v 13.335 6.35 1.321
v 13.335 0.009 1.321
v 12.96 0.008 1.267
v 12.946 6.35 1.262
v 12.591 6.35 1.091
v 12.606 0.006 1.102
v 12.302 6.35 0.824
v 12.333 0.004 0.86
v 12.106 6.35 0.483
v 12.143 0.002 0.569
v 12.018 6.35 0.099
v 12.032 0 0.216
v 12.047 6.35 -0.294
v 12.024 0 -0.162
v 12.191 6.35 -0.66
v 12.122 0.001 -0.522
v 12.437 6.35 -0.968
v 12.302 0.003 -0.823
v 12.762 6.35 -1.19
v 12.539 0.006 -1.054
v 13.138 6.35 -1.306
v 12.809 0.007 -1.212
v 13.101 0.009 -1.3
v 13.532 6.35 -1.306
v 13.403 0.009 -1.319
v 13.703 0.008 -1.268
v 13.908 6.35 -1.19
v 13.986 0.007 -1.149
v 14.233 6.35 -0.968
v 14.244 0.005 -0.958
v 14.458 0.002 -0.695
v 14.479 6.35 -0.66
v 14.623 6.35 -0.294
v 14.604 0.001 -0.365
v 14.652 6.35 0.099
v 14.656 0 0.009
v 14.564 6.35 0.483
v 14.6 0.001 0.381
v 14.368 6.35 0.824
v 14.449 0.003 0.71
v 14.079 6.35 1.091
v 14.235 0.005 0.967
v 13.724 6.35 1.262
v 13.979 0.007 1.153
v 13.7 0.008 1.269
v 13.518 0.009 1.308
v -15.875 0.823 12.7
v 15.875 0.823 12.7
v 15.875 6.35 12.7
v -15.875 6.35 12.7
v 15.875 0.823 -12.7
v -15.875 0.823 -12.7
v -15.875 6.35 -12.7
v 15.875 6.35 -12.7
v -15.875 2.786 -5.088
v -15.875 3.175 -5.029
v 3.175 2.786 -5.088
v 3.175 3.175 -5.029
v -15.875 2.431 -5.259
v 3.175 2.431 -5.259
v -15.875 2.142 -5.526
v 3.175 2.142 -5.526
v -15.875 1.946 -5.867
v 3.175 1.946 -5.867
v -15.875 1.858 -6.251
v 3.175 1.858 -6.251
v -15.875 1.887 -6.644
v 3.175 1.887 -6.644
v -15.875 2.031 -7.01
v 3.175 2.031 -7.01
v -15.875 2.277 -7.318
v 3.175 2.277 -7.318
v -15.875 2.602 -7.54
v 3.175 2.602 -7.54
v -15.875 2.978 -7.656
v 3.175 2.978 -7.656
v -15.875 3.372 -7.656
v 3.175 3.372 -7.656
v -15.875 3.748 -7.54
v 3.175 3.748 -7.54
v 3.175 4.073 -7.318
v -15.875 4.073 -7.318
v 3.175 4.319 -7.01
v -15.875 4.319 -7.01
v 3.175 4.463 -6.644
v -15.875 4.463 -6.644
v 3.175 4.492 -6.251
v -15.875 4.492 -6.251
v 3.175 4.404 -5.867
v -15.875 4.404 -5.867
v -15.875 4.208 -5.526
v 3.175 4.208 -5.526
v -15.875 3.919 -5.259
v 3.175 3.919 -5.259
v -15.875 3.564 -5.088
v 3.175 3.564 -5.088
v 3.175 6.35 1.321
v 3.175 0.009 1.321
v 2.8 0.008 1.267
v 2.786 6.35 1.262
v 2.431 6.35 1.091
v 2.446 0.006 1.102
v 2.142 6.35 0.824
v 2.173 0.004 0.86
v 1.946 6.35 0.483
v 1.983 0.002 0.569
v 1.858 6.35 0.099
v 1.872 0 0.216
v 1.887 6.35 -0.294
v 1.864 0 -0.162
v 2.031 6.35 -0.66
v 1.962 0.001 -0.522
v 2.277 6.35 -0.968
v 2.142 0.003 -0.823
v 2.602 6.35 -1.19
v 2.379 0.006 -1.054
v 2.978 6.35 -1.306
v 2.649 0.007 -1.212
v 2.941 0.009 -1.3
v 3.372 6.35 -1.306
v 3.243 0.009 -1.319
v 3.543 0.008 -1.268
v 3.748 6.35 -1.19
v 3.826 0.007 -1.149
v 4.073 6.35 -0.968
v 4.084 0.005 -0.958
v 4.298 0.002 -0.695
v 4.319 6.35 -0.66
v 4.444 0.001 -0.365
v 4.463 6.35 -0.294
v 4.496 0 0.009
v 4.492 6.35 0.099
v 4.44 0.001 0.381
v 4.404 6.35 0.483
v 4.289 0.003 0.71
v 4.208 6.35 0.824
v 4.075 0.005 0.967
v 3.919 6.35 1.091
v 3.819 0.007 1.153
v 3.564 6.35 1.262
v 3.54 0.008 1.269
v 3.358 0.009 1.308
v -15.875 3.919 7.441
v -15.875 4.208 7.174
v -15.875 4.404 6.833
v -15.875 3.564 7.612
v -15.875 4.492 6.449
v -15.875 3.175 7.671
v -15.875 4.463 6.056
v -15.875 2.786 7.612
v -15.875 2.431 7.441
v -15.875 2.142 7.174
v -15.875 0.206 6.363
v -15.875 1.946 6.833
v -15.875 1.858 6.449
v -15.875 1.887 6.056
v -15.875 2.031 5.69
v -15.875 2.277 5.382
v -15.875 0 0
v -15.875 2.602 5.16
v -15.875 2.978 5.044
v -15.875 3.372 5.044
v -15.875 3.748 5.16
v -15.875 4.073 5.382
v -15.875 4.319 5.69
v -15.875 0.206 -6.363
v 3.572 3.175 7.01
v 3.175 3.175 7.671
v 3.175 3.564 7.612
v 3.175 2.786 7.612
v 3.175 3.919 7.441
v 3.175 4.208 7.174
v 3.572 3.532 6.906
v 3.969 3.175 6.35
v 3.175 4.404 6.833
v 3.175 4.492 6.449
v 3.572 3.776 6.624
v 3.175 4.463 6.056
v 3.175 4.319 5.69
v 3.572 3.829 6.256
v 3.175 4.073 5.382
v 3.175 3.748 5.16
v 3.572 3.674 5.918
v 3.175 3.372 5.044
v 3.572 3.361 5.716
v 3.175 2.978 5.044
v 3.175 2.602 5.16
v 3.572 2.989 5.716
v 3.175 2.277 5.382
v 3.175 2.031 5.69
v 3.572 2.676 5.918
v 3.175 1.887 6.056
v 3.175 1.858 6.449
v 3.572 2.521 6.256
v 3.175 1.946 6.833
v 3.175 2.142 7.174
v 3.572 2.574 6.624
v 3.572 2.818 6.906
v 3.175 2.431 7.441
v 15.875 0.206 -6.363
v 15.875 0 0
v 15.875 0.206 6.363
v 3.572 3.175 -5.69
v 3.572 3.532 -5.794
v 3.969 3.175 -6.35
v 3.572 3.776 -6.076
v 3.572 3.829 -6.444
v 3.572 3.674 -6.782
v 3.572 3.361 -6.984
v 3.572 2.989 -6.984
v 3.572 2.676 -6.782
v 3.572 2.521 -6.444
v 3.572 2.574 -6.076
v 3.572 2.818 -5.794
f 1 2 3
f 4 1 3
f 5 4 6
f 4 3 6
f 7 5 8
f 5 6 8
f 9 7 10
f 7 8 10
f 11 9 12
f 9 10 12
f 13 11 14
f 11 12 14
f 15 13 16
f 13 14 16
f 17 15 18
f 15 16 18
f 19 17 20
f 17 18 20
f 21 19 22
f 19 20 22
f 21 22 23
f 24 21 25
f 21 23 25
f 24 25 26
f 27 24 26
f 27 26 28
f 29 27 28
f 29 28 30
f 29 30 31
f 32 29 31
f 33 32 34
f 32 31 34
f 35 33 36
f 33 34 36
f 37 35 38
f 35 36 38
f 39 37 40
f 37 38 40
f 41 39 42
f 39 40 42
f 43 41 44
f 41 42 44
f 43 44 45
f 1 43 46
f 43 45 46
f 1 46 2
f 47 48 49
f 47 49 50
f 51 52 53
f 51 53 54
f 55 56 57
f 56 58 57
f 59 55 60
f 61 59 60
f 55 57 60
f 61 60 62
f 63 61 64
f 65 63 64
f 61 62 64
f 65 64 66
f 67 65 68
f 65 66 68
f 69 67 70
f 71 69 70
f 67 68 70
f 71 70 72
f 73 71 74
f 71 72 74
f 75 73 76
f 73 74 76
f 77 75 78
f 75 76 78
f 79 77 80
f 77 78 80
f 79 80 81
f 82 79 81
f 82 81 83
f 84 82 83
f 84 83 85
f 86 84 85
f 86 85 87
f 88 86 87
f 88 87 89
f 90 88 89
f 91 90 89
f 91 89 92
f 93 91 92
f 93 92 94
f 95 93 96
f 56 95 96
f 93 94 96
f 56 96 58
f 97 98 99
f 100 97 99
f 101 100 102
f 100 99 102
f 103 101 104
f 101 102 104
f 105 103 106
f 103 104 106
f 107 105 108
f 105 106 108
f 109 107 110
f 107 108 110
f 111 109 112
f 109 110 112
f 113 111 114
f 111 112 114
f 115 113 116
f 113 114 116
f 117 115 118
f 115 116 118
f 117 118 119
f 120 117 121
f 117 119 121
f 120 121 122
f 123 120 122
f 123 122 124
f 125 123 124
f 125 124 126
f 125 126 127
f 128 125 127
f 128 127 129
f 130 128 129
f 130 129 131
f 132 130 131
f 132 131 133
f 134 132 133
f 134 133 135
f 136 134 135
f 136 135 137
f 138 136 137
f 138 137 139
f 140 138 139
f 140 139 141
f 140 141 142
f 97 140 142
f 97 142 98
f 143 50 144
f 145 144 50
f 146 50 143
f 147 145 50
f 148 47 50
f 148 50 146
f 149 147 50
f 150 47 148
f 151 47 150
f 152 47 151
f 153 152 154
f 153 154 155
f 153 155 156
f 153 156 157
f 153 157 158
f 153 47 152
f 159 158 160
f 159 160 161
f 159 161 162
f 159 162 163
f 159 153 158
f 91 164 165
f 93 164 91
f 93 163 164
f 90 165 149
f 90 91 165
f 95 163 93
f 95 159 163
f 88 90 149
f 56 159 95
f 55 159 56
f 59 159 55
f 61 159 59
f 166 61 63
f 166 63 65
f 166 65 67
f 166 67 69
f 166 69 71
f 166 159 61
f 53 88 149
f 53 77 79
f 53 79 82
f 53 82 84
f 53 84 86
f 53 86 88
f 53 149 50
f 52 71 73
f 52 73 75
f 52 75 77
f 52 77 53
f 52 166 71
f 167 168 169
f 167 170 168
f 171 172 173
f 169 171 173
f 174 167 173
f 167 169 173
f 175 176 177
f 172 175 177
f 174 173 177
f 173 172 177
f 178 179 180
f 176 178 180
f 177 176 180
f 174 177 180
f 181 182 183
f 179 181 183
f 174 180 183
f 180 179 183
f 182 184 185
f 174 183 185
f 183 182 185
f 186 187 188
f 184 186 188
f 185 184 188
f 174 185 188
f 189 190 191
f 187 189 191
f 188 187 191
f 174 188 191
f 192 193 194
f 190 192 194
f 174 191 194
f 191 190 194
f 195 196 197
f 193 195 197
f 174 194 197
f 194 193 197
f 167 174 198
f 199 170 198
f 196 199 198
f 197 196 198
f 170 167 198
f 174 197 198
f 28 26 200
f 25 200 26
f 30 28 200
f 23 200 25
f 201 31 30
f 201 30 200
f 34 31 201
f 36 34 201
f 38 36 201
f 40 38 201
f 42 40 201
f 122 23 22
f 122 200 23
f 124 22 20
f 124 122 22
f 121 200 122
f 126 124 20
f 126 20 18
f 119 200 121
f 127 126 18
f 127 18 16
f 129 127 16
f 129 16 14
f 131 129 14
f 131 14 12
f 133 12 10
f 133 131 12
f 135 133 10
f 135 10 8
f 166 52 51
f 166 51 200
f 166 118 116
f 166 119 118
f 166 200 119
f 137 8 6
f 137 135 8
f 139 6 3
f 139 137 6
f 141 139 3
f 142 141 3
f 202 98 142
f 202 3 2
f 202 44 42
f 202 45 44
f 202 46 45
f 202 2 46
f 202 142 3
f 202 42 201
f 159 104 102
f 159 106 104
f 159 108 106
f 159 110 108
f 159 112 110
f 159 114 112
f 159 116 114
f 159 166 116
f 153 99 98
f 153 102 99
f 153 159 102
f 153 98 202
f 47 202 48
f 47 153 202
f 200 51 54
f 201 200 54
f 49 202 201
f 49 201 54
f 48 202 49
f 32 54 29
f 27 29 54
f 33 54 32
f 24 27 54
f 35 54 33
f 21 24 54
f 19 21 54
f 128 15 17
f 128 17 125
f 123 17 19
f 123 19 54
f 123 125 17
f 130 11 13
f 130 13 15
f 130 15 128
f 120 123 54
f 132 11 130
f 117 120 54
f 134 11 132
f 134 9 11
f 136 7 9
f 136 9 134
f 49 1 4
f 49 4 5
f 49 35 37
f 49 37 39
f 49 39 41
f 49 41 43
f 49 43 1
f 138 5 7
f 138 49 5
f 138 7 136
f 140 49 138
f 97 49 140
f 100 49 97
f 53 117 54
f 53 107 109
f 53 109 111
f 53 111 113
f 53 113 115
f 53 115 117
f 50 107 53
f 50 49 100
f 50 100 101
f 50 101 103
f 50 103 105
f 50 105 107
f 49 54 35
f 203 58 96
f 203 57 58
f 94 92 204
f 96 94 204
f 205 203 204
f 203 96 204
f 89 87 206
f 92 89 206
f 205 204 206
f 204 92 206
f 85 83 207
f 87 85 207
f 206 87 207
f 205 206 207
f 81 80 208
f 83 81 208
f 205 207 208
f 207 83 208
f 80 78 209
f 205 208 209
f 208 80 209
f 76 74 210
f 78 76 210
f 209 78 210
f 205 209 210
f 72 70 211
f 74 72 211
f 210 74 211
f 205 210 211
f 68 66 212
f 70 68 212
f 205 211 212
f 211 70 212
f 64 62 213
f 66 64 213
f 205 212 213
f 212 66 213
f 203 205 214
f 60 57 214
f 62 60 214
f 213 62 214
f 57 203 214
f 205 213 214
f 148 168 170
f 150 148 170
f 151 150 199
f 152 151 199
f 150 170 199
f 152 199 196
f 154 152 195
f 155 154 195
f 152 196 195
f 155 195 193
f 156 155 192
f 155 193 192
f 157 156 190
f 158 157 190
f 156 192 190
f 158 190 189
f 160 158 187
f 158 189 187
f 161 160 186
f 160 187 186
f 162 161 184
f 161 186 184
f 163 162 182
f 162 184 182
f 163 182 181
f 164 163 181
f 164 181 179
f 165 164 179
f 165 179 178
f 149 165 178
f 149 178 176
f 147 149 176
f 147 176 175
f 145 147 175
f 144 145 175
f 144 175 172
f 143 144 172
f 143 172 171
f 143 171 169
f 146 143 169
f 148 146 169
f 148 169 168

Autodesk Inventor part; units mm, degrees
ref_plane "YZ Plane" through (0, 0, 0) normal (1, 0, 0) x (0, 1, 0)
ref_plane "XZ Plane" through (0, 0, 0) normal (0, 1, 0) x (-1, 0, 0)
ref_plane "XY Plane" through (0, 0, 0) normal (0, 0, 1) x (1, 0, 0)
sketch "Sketch1" plane through (0, 0, 0) normal (0, 1, 0) x (-1, 0, 0)
  line L0 (-15.875, 12.7) -> (15.875, 12.7)
  line L1 (15.875, 12.7) -> (15.875, -12.7)
  line L2 (15.875, -12.7) -> (-15.875, -12.7)
  line L3 (-15.875, -12.7) -> (-15.875, 12.7)
  line L4 (-15.875, 12.7) -> (15.875, -12.7) construction
  line L5 (15.875, 12.7) -> (-15.875, -12.7) construction
  point P0 (0, 0)
  dimension "d0" = 31.75
  dimension "d1" = 25.4
extrude "Extrusion1" add sketch "Sketch1" along normal blind 6.35
sketch "Sketch2" plane through (-15.875, 0, -12.7) normal (-1, 0, 0) x (0, 0, 1)
  line L0 (12.7, 0) -> (12.7, 6.35) construction
  line L1 (25.4, 6.35) -> (0, 6.35) construction
  line L2 (12.7, 3.175) -> (6.35, 3.175) construction
  line L3 (12.7, 3.175) -> (19.05, 3.175) construction
  dimension "d4" = 6.35
  dimension "d5" = 180
hole "Hole1" at (-15.875, 3.175, -6.35) at (-15.875, 3.175, 6.35) direction (1, 0, 0) diameter 2.6416 depth 19.05 tip angle 118 thread size "6-32 UNC" class "2B" standard "ANSI Unified Screw Threads"
sketch "Sketch3" plane through (-15.875, 0, -12.7) normal (-1, 0, 0) x (0, 0, 1)
  line L0 (12.7, 0) -> (12.7, 98.425) construction
  line L1 (12.7, 0) -> (111.125, 0) construction
  circle A0 centre (12.7, 98.425) radius 98.425
  dimension "d14" = 98.425
  dimension "d15" = 90
  dimension "d16" = 196.85
extrude "Extrusion2" cut sketch "Sketch3" against normal up to surface (31.75 mm away) keep common part
sketch "Sketch4" plane through (0, 6.35, 0) normal (0, 1, 0) x (1, 0, 0)
  line L0 (-15.875, 12.7) -> (-15.875, -12.7) construction
  line L1 (-15.875, 0) -> (3.175, 0) construction
  line L2 (-15.875, 0) -> (3.175, 0) construction
  line L3 (3.175, 0) -> (13.335, 0) construction
  line L4 (3.175, 0) -> (13.335, 0) construction
  point P0 (0, 0)
  dimension "d19" = 19.05
  dimension "d20" = 0
  dimension "d21" = 10.16
  dimension "d22" = 0
hole "Hole2" at (13.335, 6.35, 0) at (3.175, 6.35, 0) direction (0, -1, 0) diameter 2.6416 depth 19.05 tip angle 118 thread size "6-32 UNC" class "2B" standard "ANSI Unified Screw Threads"
properties part number "4K adapter" material "Copper"
